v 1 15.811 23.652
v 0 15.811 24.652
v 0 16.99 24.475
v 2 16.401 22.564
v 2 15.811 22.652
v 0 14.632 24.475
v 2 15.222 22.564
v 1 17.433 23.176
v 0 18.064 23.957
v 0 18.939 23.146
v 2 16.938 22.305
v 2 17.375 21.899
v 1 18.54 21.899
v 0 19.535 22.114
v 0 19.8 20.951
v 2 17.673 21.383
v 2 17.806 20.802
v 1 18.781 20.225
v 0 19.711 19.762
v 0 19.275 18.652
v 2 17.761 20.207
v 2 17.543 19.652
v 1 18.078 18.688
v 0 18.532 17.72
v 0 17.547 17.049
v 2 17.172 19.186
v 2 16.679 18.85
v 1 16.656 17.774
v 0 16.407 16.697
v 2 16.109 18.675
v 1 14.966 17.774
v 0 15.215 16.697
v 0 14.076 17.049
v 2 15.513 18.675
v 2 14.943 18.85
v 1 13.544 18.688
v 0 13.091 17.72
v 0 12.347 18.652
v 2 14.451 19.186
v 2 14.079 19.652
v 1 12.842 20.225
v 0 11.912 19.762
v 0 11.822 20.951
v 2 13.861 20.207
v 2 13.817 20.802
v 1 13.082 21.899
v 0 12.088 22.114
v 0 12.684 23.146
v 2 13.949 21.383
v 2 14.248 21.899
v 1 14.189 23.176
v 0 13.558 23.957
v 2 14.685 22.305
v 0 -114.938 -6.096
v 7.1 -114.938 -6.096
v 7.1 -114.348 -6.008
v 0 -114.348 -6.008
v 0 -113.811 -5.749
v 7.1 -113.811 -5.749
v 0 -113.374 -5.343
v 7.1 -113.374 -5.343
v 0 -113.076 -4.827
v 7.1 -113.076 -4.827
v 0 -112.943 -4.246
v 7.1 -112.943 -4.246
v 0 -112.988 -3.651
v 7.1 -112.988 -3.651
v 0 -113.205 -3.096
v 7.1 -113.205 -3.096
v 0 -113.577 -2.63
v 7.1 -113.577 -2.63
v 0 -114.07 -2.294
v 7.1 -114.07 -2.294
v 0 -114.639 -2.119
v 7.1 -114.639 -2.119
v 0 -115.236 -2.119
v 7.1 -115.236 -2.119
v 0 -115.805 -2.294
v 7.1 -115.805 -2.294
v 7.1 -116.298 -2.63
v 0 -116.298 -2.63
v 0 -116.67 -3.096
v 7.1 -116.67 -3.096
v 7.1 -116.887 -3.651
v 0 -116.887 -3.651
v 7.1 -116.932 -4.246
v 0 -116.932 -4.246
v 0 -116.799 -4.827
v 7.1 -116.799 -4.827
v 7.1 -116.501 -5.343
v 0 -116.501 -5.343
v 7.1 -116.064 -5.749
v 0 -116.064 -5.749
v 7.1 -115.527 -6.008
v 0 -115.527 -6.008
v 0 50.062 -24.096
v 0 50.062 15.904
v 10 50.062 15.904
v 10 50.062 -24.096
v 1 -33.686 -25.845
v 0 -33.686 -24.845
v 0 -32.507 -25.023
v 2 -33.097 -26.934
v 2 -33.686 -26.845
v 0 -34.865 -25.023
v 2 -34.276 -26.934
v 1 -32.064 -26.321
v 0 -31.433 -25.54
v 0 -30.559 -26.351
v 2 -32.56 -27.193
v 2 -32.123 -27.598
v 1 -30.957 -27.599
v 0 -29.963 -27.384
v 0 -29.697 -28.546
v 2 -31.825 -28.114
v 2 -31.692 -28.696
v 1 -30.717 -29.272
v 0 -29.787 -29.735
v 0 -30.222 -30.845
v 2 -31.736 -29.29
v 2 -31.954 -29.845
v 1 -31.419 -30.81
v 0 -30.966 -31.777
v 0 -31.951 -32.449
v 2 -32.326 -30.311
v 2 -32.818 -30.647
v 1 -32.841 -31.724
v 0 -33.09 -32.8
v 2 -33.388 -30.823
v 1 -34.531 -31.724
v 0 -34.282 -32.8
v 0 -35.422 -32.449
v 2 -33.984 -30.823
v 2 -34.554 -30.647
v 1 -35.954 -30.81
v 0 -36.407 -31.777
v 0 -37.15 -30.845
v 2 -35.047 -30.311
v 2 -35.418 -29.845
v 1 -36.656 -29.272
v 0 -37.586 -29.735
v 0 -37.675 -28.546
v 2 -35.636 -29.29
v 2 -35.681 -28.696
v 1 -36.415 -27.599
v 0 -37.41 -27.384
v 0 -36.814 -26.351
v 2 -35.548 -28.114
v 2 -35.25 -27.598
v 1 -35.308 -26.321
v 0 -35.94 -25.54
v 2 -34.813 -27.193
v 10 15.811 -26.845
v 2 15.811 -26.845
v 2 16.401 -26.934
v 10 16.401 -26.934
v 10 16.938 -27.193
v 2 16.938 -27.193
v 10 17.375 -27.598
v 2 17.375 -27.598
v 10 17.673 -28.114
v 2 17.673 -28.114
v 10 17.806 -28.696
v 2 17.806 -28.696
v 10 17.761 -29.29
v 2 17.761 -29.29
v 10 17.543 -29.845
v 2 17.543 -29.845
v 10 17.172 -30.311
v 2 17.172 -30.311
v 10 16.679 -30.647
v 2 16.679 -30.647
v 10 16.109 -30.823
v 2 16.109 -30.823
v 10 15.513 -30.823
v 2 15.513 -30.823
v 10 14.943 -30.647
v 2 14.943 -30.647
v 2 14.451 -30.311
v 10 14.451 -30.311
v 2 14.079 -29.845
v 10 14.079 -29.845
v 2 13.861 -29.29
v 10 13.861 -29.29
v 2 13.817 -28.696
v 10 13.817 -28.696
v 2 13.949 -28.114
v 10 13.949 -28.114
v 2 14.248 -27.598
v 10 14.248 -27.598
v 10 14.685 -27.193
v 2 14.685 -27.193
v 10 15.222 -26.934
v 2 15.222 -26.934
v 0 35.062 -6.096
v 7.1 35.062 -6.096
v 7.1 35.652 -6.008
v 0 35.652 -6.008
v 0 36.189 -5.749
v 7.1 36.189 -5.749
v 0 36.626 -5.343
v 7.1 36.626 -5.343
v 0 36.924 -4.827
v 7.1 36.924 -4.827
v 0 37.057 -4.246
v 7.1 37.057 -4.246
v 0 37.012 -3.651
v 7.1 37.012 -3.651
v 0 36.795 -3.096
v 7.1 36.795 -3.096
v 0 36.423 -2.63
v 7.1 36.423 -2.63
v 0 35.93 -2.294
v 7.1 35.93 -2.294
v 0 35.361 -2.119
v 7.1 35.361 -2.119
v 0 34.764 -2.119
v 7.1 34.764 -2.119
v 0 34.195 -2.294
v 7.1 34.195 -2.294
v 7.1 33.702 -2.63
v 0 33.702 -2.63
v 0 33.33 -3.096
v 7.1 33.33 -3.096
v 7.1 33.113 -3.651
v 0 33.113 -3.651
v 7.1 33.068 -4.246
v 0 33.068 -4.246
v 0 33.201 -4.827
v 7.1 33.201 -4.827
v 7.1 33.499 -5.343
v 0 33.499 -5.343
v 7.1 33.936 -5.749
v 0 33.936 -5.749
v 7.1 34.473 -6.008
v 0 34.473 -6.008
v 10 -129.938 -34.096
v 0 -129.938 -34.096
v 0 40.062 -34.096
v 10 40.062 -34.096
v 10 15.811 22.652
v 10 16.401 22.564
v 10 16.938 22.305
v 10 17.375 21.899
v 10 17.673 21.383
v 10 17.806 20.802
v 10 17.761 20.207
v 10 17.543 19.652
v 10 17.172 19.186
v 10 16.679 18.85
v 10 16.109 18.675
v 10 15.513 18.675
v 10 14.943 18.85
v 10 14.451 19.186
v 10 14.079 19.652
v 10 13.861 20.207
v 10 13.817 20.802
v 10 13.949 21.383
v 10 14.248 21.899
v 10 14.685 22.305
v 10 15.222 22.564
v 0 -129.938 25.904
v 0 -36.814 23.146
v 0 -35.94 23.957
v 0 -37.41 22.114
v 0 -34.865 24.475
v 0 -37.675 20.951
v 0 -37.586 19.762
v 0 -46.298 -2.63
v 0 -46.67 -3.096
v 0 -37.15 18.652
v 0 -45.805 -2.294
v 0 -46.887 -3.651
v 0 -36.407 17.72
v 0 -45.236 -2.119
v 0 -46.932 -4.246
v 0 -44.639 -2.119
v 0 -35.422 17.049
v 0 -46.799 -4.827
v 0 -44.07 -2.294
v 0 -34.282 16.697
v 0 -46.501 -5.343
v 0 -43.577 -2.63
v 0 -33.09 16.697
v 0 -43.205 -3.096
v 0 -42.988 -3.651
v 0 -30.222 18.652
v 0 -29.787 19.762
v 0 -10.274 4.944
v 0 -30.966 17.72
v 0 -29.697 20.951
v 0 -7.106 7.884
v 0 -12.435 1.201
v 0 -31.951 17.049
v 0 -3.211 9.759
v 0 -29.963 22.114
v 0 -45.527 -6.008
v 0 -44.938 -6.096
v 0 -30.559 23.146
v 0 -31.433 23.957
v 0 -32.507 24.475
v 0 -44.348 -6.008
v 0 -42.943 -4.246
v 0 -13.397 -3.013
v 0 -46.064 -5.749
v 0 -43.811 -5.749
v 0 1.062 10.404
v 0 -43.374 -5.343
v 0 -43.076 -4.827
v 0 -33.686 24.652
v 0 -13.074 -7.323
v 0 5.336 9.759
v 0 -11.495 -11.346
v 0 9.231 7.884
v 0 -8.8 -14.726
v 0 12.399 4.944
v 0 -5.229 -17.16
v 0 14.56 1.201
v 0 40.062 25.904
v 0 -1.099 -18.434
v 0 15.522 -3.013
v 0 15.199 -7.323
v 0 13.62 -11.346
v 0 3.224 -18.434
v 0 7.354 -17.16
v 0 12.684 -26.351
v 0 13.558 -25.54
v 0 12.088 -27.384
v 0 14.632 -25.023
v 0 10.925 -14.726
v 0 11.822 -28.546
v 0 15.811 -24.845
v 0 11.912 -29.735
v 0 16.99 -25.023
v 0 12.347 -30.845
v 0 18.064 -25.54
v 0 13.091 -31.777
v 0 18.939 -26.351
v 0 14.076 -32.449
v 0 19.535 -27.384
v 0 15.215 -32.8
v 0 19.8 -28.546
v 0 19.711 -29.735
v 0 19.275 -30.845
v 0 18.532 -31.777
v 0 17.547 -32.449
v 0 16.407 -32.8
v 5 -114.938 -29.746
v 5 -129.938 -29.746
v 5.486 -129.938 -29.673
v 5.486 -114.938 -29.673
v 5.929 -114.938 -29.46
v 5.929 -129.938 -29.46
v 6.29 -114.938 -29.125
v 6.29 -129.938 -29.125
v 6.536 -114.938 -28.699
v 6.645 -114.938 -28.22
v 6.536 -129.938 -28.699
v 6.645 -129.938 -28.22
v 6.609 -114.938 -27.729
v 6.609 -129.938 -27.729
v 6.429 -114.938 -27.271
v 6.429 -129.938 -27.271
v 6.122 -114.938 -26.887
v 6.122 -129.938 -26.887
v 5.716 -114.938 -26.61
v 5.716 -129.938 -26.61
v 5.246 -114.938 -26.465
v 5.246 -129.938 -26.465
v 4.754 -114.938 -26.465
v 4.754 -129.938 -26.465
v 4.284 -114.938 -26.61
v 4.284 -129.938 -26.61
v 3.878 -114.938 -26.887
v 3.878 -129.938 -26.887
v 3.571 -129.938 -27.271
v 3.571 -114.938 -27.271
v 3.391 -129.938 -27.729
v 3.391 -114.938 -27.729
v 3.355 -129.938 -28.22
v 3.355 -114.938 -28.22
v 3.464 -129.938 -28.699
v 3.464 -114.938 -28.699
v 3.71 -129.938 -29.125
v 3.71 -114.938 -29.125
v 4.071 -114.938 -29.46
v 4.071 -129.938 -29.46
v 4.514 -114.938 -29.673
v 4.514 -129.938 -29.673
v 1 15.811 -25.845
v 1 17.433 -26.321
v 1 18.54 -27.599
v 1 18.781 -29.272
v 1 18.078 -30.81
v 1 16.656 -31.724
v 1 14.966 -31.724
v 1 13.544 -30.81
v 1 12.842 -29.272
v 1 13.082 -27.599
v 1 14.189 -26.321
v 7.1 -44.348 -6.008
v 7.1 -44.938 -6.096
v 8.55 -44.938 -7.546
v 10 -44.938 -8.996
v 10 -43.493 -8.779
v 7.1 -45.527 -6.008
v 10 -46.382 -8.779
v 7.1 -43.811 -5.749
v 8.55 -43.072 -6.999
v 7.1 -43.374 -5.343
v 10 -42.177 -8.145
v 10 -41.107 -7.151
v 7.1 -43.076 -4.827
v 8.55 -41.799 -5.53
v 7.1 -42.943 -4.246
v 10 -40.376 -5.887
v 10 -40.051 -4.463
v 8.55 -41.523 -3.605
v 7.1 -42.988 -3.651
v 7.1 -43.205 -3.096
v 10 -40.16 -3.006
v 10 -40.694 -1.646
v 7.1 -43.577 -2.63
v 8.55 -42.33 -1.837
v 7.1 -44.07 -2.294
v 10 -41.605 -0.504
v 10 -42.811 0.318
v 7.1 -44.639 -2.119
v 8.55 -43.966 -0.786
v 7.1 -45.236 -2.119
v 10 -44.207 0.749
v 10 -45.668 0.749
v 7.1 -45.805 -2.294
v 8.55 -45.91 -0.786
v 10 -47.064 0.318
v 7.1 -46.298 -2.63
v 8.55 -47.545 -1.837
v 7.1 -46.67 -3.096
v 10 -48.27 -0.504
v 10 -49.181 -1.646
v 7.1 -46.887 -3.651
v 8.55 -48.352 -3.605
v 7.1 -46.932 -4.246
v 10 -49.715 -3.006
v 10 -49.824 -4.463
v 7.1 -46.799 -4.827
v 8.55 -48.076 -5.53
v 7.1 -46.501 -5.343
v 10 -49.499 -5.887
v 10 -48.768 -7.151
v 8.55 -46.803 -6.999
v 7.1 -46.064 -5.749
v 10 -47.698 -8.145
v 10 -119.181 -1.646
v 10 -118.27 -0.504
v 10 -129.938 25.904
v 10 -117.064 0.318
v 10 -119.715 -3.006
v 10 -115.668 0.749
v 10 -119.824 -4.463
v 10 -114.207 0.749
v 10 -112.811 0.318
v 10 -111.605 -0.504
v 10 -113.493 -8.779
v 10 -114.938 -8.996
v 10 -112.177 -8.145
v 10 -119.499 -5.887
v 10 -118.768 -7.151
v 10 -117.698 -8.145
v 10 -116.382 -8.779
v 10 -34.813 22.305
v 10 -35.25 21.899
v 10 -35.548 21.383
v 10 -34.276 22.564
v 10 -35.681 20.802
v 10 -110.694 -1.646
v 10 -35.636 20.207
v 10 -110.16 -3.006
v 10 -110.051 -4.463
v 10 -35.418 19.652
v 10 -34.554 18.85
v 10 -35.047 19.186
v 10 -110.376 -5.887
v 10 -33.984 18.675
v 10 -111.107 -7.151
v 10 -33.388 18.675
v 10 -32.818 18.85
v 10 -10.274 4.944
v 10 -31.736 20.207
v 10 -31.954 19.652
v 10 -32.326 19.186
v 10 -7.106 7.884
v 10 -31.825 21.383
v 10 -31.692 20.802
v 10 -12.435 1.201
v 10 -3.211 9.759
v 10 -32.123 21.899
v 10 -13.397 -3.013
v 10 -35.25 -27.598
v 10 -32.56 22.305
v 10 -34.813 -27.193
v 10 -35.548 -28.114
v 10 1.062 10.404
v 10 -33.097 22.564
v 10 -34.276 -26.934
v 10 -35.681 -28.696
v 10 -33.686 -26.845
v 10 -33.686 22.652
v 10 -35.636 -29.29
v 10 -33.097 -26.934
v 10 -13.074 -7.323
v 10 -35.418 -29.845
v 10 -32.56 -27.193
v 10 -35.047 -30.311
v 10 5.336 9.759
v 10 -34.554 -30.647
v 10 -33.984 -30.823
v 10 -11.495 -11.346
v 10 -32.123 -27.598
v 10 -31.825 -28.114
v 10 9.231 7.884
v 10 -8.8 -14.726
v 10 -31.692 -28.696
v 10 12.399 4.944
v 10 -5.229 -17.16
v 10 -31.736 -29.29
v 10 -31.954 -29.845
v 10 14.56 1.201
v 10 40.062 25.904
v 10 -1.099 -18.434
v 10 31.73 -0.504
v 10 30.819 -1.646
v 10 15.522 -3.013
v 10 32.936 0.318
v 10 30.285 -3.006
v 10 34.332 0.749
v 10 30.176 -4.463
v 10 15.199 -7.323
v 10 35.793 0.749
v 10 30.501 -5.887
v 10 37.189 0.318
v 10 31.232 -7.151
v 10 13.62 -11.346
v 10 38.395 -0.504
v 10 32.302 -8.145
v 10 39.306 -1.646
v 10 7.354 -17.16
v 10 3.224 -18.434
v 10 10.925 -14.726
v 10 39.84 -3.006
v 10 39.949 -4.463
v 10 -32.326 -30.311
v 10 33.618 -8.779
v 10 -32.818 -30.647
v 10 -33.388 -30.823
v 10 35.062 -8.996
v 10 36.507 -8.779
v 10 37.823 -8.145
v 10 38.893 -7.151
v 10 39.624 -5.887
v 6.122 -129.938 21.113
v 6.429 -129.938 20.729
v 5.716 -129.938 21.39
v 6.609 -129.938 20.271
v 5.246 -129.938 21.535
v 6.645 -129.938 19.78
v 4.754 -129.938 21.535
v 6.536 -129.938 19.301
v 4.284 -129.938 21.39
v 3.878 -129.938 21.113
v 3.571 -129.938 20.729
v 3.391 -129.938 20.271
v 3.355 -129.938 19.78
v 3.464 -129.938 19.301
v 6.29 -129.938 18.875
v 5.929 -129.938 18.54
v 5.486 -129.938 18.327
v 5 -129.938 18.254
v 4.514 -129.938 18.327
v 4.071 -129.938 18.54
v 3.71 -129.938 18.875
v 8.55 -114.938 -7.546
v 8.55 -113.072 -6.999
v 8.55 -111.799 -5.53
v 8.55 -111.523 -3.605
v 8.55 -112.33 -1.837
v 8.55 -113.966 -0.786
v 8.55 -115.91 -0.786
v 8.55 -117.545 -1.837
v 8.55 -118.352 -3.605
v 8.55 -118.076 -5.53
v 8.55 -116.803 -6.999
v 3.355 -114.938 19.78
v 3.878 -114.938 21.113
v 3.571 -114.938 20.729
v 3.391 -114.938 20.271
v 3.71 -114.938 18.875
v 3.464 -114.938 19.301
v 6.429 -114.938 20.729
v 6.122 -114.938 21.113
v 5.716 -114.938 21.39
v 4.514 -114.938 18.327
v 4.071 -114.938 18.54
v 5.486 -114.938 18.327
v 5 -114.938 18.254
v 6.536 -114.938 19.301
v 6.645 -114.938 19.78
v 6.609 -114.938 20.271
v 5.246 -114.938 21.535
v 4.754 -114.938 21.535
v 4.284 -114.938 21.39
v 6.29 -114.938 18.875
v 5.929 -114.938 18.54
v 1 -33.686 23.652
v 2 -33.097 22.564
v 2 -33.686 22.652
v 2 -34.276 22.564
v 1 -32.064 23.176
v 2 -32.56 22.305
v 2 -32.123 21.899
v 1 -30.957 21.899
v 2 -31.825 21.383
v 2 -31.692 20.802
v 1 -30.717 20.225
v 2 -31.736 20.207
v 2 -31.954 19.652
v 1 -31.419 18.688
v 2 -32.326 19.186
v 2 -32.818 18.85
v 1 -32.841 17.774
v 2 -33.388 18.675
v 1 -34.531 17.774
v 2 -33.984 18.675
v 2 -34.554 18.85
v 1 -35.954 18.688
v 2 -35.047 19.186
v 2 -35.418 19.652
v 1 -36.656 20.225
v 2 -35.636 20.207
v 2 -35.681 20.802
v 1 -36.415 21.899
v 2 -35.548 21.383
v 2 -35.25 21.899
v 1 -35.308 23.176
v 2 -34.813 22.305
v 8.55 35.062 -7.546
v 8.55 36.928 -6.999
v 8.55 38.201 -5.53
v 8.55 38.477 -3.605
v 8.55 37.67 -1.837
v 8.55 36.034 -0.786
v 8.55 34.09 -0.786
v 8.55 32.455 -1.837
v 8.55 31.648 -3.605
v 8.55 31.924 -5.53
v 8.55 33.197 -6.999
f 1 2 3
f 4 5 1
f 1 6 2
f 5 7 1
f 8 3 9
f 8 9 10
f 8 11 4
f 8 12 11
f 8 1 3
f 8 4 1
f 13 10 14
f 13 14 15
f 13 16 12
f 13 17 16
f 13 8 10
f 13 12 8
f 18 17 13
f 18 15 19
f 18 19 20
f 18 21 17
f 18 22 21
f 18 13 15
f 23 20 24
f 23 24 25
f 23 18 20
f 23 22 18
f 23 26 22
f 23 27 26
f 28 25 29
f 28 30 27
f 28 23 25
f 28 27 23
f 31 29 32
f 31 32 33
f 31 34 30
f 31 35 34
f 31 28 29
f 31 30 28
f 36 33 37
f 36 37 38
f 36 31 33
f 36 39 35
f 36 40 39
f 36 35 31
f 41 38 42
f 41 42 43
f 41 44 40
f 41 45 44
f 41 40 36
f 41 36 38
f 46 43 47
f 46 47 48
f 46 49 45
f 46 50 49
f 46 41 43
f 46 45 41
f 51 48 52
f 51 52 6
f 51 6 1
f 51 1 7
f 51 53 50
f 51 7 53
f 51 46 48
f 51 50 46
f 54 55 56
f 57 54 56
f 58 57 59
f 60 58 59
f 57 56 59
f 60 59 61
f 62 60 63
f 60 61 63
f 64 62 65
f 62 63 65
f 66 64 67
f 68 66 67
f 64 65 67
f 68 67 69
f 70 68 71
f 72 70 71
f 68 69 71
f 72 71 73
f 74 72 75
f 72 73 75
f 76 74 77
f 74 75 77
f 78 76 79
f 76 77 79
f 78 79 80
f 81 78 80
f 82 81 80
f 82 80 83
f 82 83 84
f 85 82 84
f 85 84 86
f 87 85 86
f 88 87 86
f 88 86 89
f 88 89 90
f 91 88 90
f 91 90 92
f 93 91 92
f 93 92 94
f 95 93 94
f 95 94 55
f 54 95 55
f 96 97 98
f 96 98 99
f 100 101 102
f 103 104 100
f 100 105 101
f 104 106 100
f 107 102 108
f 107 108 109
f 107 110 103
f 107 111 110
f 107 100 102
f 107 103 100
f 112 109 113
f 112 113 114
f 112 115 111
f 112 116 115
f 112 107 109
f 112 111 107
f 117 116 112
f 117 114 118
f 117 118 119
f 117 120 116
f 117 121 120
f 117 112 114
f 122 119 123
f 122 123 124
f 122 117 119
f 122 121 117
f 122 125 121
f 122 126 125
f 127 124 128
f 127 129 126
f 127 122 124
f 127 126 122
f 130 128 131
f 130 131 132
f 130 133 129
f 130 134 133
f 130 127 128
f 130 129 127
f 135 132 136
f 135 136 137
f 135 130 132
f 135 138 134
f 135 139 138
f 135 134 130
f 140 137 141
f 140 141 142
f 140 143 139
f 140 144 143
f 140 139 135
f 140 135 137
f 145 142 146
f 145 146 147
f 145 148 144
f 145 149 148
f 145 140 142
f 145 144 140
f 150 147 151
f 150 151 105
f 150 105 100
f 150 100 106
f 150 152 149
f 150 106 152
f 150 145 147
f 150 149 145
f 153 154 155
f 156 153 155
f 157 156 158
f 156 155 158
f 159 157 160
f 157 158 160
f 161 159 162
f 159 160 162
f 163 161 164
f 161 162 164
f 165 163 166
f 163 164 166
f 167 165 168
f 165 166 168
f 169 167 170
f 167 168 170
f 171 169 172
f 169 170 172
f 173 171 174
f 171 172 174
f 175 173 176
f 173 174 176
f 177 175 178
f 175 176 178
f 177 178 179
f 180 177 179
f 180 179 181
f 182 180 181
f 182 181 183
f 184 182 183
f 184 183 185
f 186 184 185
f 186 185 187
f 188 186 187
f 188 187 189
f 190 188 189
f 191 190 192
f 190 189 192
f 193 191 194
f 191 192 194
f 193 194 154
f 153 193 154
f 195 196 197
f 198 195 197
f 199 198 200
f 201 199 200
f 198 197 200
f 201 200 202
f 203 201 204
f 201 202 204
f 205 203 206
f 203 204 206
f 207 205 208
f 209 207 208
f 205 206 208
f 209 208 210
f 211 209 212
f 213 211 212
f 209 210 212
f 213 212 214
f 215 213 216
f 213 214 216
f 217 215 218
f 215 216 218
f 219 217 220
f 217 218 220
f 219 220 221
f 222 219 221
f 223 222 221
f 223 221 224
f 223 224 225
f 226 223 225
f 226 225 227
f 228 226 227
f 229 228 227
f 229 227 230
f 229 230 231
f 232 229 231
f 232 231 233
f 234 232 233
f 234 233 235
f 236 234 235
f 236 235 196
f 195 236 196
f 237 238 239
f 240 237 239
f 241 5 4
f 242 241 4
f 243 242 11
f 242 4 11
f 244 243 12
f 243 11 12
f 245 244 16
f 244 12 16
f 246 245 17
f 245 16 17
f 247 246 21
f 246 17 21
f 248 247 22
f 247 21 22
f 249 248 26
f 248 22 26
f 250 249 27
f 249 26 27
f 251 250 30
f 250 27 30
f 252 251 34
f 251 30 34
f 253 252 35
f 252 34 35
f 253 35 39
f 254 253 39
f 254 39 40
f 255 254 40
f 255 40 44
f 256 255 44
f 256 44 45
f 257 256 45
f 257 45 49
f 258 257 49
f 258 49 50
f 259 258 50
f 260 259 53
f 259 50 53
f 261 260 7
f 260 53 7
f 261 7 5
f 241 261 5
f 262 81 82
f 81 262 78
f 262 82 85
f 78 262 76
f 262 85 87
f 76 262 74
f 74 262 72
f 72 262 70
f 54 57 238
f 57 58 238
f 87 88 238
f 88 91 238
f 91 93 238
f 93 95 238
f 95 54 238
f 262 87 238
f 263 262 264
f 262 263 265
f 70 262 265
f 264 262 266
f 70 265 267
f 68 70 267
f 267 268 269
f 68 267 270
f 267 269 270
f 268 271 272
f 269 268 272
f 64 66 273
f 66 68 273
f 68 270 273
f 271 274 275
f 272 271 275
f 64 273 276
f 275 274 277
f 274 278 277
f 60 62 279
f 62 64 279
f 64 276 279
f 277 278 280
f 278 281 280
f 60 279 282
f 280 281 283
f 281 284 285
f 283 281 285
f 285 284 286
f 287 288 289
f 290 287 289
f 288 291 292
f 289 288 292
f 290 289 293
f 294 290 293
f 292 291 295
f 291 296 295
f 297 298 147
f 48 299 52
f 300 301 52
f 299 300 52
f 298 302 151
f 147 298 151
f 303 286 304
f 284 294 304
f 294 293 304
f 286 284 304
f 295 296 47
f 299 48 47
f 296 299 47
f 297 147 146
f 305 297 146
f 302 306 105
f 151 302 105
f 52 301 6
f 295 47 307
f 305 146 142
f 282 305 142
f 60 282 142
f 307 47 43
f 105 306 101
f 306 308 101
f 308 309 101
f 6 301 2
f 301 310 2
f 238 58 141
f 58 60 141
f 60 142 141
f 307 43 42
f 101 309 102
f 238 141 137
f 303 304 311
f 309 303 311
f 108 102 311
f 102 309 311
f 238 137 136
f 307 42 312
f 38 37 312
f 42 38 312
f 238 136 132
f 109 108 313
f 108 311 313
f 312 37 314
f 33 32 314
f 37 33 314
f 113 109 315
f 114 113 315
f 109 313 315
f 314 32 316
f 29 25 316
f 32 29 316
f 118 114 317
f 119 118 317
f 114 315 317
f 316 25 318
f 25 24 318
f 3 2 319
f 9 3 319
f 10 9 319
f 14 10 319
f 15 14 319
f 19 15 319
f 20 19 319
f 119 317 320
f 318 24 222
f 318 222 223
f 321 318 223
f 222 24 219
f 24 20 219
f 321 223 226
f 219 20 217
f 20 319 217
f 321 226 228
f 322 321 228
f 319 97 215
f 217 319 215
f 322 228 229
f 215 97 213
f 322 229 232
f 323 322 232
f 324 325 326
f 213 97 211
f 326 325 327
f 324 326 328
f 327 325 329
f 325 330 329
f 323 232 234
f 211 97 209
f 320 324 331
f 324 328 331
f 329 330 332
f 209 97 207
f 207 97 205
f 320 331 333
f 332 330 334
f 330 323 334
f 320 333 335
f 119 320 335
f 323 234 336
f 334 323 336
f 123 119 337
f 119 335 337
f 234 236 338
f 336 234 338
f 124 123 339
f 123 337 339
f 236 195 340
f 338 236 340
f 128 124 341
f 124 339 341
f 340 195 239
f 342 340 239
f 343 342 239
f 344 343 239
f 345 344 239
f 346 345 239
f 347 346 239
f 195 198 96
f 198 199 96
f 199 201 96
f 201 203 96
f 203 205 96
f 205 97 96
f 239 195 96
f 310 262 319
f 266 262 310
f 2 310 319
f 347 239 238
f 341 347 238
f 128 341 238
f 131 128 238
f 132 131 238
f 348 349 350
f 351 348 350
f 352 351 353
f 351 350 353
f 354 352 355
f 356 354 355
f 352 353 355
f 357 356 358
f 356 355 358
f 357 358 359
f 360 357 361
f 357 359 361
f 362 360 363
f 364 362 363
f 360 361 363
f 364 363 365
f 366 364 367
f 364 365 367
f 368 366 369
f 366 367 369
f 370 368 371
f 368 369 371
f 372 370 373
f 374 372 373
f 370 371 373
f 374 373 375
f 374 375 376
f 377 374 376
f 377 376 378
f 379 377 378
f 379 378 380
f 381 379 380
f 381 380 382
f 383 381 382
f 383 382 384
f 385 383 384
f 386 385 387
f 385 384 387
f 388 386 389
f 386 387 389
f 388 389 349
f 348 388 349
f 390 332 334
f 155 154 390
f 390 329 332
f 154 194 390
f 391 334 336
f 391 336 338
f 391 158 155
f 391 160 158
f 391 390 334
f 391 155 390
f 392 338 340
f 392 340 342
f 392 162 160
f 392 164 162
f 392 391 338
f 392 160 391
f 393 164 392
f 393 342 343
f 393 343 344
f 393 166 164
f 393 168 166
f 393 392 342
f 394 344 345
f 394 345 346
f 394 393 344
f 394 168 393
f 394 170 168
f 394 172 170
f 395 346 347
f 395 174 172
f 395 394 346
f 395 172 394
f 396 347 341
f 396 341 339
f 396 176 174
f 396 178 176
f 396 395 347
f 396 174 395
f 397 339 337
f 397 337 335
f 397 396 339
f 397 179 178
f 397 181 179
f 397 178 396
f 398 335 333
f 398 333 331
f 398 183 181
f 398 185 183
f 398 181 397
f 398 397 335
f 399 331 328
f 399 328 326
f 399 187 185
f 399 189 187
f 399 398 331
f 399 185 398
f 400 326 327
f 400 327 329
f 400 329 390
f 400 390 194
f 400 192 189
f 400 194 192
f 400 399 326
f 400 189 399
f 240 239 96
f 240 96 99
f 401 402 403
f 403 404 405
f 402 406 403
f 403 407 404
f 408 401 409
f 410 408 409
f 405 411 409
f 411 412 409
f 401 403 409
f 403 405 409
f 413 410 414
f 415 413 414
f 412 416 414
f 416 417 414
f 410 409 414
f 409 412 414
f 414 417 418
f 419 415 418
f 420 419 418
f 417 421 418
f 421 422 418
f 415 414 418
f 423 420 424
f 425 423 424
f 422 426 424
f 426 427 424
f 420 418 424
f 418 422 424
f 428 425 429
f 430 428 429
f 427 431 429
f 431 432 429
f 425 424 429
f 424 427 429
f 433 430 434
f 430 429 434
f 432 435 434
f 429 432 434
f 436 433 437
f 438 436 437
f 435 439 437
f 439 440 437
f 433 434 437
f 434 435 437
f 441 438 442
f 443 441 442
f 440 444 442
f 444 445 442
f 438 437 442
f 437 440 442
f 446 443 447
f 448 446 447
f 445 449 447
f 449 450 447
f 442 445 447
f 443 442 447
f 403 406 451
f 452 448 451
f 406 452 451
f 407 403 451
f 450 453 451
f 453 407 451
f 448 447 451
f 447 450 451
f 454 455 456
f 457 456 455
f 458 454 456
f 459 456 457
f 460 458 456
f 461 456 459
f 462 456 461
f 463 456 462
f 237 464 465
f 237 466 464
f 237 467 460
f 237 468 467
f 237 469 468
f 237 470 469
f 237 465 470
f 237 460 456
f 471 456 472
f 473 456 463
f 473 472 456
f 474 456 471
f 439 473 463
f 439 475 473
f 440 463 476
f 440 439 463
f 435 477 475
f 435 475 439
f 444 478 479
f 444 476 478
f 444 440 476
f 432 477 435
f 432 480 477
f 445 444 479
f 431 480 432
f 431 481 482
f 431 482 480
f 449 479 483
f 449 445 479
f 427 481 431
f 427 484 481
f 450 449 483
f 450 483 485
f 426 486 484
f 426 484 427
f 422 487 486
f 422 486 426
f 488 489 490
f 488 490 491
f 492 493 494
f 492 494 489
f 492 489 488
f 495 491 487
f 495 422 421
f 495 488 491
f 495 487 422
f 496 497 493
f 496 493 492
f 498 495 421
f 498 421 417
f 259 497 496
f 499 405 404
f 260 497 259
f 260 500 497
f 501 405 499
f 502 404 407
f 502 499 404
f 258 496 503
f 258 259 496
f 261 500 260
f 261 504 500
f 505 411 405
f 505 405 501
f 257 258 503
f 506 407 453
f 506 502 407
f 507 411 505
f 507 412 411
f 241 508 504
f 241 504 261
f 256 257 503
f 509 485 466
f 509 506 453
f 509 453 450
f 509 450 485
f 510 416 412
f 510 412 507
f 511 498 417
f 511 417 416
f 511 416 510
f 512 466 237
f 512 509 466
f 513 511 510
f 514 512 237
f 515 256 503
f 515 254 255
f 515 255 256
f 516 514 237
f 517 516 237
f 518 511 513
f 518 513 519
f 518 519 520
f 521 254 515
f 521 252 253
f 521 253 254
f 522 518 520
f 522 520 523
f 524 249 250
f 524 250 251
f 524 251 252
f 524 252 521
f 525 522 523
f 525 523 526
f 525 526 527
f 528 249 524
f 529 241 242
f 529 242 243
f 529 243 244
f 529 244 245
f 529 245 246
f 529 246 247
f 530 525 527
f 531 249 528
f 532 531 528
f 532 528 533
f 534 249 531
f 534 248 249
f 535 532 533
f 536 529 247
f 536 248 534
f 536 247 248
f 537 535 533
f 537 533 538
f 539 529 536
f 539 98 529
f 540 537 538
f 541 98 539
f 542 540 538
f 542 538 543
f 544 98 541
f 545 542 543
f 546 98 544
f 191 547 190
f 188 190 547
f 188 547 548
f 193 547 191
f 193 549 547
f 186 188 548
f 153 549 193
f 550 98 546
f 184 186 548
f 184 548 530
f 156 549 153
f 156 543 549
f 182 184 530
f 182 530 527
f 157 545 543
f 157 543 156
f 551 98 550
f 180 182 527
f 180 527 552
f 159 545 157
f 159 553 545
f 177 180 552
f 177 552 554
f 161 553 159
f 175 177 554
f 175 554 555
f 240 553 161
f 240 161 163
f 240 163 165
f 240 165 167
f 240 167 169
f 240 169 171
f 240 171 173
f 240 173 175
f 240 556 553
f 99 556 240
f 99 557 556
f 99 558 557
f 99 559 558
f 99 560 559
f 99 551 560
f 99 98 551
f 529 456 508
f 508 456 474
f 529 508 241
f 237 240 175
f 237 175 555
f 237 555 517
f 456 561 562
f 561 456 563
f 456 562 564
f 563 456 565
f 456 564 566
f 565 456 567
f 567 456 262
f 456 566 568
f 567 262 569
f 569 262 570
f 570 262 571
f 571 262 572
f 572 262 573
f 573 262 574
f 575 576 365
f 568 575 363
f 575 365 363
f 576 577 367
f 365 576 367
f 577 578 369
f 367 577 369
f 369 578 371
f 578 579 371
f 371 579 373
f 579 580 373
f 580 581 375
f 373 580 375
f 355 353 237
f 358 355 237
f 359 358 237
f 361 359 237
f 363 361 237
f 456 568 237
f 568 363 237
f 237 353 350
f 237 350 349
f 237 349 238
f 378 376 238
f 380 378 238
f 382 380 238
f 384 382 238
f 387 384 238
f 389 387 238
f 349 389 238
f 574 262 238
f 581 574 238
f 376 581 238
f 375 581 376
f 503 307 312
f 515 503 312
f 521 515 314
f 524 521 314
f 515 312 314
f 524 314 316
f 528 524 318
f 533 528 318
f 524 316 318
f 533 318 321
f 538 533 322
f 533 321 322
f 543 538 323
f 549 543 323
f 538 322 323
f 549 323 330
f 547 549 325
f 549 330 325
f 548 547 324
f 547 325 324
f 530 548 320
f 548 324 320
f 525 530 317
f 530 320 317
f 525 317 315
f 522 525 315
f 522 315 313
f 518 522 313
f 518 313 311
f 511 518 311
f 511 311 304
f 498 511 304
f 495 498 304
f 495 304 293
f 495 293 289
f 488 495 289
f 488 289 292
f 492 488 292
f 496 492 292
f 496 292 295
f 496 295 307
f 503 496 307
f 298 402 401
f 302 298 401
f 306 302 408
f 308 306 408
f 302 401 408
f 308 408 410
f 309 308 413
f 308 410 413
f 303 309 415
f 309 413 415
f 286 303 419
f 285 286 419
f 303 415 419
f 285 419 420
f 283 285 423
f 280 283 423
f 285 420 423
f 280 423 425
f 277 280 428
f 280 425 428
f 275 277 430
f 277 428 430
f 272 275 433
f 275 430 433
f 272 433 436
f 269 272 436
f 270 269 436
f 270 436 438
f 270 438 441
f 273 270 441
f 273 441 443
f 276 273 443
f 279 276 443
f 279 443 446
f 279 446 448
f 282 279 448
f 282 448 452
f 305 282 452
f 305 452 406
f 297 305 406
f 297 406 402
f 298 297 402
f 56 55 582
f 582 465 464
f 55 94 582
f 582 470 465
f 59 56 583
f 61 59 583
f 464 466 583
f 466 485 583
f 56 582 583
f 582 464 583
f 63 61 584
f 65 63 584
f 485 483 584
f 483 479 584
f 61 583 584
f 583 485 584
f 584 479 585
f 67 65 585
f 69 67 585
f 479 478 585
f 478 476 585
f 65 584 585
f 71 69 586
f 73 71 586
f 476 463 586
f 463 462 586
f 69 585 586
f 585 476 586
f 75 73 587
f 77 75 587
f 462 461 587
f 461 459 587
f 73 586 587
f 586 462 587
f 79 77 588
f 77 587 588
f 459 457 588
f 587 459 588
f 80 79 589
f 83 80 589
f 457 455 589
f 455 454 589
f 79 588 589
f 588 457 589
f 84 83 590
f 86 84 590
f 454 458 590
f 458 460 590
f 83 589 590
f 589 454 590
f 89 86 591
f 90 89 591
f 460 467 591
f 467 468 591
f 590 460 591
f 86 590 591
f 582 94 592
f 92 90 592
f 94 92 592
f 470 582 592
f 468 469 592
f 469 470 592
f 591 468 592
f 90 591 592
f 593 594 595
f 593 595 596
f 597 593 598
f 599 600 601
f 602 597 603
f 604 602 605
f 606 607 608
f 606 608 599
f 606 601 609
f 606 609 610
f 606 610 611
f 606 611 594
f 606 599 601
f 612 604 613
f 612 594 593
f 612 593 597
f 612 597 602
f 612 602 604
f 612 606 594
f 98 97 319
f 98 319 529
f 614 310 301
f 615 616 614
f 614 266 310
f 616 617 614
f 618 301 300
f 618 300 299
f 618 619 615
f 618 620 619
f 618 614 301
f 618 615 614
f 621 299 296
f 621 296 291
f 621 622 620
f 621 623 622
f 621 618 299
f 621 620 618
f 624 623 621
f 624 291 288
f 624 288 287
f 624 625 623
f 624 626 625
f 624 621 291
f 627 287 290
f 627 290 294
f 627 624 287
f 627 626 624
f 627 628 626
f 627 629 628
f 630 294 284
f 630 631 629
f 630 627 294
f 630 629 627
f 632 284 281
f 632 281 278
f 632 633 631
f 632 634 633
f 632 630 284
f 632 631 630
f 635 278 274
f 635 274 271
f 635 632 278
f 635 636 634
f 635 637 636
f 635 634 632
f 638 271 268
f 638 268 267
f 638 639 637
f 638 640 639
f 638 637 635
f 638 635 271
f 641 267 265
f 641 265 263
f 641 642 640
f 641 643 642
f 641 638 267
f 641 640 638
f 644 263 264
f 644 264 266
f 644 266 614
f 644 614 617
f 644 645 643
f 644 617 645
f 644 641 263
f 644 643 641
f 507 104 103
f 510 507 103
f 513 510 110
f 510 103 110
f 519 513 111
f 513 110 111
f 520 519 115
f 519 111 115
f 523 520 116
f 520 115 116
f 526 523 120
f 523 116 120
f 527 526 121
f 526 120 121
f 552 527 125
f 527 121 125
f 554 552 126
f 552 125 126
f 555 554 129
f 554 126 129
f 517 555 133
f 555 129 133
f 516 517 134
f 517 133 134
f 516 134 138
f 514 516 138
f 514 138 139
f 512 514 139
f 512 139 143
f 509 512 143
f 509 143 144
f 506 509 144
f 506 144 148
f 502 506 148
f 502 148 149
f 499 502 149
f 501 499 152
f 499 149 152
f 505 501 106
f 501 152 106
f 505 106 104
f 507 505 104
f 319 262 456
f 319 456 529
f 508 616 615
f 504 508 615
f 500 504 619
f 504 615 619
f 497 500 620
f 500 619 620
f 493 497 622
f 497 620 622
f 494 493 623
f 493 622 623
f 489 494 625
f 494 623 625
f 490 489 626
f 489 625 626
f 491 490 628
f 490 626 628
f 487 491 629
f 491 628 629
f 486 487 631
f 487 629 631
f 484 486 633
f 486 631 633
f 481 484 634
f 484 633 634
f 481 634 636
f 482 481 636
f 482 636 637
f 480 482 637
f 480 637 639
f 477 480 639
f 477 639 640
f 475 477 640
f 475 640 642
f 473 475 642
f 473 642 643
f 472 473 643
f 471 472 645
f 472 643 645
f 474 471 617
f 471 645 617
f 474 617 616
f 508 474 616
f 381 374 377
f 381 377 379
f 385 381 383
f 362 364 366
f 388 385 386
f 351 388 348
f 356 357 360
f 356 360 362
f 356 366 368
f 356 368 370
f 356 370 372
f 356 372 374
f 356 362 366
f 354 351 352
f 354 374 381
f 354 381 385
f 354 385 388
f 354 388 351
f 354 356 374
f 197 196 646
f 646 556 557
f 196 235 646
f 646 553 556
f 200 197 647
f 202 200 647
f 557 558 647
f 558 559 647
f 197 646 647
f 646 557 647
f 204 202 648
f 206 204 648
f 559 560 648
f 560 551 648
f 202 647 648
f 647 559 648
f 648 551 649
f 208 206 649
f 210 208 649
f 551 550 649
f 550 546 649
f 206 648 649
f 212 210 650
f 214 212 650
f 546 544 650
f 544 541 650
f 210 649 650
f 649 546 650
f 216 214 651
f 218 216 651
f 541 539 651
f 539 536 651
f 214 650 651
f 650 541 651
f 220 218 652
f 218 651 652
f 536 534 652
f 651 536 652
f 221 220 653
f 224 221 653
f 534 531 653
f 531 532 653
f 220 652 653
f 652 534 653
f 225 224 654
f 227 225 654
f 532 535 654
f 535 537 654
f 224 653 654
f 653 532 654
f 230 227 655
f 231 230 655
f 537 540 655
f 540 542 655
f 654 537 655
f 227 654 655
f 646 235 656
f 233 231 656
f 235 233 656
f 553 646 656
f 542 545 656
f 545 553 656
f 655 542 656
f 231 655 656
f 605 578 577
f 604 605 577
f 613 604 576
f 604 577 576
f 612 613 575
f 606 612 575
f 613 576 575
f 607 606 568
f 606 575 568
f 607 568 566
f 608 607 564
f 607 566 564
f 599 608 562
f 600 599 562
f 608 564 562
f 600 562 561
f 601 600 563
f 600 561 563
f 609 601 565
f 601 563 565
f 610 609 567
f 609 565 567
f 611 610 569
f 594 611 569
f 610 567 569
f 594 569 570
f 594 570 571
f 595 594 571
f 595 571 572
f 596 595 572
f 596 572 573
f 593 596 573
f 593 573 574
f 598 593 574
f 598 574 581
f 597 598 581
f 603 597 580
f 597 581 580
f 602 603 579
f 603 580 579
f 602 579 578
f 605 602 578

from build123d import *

# Parameters (mm, degrees)
SKETCH_1_W          = 60
SKETCH_1_H          = 180
EXTRUDE_1_DEPTH     = 10
SKETCH_2_R          = 14.5
CUT_EXTRUDE_1_DEPTH = 30
SKETCH_3_R          = 2
CUT_EXTRUDE_2_DEPTH = 10
CHAMFER_2_SIZE      = 2
SKETCH_4_R          = 2
CUT_EXTRUDE_3_DEPTH = 15
CHAMFER_3_SIZE      = 2.9
CHAMFER_4_SIZE      = 10
SKETCH_5_R          = 1.65
CUT_EXTRUDE_4_DEPTH = 15


with BuildPart() as part:
    # Эскиз1 → Бобышка-Вытянуть1 (new body)
    with BuildSketch(Plane(origin=(0, 0, 0), x_dir=(0, 0, -1), z_dir=(1, 0, 0))):
        with Locations((4.096360158, -39.937525072)):
            Rectangle(SKETCH_1_W, SKETCH_1_H)
    extrude(amount=EXTRUDE_1_DEPTH)

    # Эскиз2 → Вырез-Вытянуть1 (cut)
    with BuildSketch(Plane.ZY):
        with Locations((-4.096360158, 1.062474928)):
            Circle(SKETCH_2_R)
    extrude(amount=-CUT_EXTRUDE_1_DEPTH, mode=Mode.SUBTRACT)

    # Эскиз3 → Вырез-Вытянуть2 (cut)
    with BuildSketch(Plane.ZY):
        with Locations((-28.8450975, 15.811212269)):
            Circle(SKETCH_3_R)
        with Locations((-28.8450975, -33.686262414)):
            Circle(SKETCH_3_R)
        with Locations((20.652377183, 15.811212269)):
            Circle(SKETCH_3_R)
        with Locations((20.652377183, -33.686262414)):
            Circle(SKETCH_3_R)
    extrude(amount=-CUT_EXTRUDE_2_DEPTH, mode=Mode.SUBTRACT)

    # Фаска2
    chamfer_2_edges = [part.edges().sort_by_distance(p)[0] for p in [
        (0, 15.811212269, -30.8450975),
        (0, -33.686262414, -30.8450975),
        (0, 15.811212269, 18.652377183),
        (0, -33.686262414, 18.652377183),
    ]]
    chamfer(chamfer_2_edges, length=CHAMFER_2_SIZE)

    # Эскиз4 → Вырез-Вытянуть3 (cut)
    with BuildSketch(Plane(origin=(10, 0, 0), x_dir=(0, 0, -1), z_dir=(1, 0, 0))):
        with Locations((4.096360158, -114.937525072)):
            Circle(SKETCH_4_R)
        with Locations((4.096360158, -44.937525072)):
            Circle(SKETCH_4_R)
        with Locations((4.096360158, 35.062474928)):
            Circle(SKETCH_4_R)
    extrude(amount=-CUT_EXTRUDE_3_DEPTH, mode=Mode.SUBTRACT)

    # Фаска3
    chamfer_3_edges = [part.edges().sort_by_distance(p)[0] for p in [
        (10, -114.937525072, -2.096360158),
        (10, -44.937525072, -2.096360158),
        (10, 35.062474928, -2.096360158),
    ]]
    chamfer(chamfer_3_edges, length=CHAMFER_3_SIZE)

    # Фаска4
    chamfer_4_edges = [part.edges().sort_by_distance(p)[0] for p in [
        (5, 50.062474928, 25.903639842),
        (5, 50.062474928, -34.096360158),
    ]]
    chamfer(chamfer_4_edges, length=CHAMFER_4_SIZE)

    # Эскиз5 → Вырез-Вытянуть4 (cut)
    with BuildSketch(Plane.XZ.offset(129.937525072)):
        with Locations(Location((5, 19.903639842, 0), (0, 0, 270))):
            Circle(SKETCH_5_R)
        with Locations(Location((5, -28.096360158, 0), (0, 0, 270))):
            Circle(SKETCH_5_R)
    extrude(amount=-CUT_EXTRUDE_4_DEPTH, mode=Mode.SUBTRACT)


solid = part.part
